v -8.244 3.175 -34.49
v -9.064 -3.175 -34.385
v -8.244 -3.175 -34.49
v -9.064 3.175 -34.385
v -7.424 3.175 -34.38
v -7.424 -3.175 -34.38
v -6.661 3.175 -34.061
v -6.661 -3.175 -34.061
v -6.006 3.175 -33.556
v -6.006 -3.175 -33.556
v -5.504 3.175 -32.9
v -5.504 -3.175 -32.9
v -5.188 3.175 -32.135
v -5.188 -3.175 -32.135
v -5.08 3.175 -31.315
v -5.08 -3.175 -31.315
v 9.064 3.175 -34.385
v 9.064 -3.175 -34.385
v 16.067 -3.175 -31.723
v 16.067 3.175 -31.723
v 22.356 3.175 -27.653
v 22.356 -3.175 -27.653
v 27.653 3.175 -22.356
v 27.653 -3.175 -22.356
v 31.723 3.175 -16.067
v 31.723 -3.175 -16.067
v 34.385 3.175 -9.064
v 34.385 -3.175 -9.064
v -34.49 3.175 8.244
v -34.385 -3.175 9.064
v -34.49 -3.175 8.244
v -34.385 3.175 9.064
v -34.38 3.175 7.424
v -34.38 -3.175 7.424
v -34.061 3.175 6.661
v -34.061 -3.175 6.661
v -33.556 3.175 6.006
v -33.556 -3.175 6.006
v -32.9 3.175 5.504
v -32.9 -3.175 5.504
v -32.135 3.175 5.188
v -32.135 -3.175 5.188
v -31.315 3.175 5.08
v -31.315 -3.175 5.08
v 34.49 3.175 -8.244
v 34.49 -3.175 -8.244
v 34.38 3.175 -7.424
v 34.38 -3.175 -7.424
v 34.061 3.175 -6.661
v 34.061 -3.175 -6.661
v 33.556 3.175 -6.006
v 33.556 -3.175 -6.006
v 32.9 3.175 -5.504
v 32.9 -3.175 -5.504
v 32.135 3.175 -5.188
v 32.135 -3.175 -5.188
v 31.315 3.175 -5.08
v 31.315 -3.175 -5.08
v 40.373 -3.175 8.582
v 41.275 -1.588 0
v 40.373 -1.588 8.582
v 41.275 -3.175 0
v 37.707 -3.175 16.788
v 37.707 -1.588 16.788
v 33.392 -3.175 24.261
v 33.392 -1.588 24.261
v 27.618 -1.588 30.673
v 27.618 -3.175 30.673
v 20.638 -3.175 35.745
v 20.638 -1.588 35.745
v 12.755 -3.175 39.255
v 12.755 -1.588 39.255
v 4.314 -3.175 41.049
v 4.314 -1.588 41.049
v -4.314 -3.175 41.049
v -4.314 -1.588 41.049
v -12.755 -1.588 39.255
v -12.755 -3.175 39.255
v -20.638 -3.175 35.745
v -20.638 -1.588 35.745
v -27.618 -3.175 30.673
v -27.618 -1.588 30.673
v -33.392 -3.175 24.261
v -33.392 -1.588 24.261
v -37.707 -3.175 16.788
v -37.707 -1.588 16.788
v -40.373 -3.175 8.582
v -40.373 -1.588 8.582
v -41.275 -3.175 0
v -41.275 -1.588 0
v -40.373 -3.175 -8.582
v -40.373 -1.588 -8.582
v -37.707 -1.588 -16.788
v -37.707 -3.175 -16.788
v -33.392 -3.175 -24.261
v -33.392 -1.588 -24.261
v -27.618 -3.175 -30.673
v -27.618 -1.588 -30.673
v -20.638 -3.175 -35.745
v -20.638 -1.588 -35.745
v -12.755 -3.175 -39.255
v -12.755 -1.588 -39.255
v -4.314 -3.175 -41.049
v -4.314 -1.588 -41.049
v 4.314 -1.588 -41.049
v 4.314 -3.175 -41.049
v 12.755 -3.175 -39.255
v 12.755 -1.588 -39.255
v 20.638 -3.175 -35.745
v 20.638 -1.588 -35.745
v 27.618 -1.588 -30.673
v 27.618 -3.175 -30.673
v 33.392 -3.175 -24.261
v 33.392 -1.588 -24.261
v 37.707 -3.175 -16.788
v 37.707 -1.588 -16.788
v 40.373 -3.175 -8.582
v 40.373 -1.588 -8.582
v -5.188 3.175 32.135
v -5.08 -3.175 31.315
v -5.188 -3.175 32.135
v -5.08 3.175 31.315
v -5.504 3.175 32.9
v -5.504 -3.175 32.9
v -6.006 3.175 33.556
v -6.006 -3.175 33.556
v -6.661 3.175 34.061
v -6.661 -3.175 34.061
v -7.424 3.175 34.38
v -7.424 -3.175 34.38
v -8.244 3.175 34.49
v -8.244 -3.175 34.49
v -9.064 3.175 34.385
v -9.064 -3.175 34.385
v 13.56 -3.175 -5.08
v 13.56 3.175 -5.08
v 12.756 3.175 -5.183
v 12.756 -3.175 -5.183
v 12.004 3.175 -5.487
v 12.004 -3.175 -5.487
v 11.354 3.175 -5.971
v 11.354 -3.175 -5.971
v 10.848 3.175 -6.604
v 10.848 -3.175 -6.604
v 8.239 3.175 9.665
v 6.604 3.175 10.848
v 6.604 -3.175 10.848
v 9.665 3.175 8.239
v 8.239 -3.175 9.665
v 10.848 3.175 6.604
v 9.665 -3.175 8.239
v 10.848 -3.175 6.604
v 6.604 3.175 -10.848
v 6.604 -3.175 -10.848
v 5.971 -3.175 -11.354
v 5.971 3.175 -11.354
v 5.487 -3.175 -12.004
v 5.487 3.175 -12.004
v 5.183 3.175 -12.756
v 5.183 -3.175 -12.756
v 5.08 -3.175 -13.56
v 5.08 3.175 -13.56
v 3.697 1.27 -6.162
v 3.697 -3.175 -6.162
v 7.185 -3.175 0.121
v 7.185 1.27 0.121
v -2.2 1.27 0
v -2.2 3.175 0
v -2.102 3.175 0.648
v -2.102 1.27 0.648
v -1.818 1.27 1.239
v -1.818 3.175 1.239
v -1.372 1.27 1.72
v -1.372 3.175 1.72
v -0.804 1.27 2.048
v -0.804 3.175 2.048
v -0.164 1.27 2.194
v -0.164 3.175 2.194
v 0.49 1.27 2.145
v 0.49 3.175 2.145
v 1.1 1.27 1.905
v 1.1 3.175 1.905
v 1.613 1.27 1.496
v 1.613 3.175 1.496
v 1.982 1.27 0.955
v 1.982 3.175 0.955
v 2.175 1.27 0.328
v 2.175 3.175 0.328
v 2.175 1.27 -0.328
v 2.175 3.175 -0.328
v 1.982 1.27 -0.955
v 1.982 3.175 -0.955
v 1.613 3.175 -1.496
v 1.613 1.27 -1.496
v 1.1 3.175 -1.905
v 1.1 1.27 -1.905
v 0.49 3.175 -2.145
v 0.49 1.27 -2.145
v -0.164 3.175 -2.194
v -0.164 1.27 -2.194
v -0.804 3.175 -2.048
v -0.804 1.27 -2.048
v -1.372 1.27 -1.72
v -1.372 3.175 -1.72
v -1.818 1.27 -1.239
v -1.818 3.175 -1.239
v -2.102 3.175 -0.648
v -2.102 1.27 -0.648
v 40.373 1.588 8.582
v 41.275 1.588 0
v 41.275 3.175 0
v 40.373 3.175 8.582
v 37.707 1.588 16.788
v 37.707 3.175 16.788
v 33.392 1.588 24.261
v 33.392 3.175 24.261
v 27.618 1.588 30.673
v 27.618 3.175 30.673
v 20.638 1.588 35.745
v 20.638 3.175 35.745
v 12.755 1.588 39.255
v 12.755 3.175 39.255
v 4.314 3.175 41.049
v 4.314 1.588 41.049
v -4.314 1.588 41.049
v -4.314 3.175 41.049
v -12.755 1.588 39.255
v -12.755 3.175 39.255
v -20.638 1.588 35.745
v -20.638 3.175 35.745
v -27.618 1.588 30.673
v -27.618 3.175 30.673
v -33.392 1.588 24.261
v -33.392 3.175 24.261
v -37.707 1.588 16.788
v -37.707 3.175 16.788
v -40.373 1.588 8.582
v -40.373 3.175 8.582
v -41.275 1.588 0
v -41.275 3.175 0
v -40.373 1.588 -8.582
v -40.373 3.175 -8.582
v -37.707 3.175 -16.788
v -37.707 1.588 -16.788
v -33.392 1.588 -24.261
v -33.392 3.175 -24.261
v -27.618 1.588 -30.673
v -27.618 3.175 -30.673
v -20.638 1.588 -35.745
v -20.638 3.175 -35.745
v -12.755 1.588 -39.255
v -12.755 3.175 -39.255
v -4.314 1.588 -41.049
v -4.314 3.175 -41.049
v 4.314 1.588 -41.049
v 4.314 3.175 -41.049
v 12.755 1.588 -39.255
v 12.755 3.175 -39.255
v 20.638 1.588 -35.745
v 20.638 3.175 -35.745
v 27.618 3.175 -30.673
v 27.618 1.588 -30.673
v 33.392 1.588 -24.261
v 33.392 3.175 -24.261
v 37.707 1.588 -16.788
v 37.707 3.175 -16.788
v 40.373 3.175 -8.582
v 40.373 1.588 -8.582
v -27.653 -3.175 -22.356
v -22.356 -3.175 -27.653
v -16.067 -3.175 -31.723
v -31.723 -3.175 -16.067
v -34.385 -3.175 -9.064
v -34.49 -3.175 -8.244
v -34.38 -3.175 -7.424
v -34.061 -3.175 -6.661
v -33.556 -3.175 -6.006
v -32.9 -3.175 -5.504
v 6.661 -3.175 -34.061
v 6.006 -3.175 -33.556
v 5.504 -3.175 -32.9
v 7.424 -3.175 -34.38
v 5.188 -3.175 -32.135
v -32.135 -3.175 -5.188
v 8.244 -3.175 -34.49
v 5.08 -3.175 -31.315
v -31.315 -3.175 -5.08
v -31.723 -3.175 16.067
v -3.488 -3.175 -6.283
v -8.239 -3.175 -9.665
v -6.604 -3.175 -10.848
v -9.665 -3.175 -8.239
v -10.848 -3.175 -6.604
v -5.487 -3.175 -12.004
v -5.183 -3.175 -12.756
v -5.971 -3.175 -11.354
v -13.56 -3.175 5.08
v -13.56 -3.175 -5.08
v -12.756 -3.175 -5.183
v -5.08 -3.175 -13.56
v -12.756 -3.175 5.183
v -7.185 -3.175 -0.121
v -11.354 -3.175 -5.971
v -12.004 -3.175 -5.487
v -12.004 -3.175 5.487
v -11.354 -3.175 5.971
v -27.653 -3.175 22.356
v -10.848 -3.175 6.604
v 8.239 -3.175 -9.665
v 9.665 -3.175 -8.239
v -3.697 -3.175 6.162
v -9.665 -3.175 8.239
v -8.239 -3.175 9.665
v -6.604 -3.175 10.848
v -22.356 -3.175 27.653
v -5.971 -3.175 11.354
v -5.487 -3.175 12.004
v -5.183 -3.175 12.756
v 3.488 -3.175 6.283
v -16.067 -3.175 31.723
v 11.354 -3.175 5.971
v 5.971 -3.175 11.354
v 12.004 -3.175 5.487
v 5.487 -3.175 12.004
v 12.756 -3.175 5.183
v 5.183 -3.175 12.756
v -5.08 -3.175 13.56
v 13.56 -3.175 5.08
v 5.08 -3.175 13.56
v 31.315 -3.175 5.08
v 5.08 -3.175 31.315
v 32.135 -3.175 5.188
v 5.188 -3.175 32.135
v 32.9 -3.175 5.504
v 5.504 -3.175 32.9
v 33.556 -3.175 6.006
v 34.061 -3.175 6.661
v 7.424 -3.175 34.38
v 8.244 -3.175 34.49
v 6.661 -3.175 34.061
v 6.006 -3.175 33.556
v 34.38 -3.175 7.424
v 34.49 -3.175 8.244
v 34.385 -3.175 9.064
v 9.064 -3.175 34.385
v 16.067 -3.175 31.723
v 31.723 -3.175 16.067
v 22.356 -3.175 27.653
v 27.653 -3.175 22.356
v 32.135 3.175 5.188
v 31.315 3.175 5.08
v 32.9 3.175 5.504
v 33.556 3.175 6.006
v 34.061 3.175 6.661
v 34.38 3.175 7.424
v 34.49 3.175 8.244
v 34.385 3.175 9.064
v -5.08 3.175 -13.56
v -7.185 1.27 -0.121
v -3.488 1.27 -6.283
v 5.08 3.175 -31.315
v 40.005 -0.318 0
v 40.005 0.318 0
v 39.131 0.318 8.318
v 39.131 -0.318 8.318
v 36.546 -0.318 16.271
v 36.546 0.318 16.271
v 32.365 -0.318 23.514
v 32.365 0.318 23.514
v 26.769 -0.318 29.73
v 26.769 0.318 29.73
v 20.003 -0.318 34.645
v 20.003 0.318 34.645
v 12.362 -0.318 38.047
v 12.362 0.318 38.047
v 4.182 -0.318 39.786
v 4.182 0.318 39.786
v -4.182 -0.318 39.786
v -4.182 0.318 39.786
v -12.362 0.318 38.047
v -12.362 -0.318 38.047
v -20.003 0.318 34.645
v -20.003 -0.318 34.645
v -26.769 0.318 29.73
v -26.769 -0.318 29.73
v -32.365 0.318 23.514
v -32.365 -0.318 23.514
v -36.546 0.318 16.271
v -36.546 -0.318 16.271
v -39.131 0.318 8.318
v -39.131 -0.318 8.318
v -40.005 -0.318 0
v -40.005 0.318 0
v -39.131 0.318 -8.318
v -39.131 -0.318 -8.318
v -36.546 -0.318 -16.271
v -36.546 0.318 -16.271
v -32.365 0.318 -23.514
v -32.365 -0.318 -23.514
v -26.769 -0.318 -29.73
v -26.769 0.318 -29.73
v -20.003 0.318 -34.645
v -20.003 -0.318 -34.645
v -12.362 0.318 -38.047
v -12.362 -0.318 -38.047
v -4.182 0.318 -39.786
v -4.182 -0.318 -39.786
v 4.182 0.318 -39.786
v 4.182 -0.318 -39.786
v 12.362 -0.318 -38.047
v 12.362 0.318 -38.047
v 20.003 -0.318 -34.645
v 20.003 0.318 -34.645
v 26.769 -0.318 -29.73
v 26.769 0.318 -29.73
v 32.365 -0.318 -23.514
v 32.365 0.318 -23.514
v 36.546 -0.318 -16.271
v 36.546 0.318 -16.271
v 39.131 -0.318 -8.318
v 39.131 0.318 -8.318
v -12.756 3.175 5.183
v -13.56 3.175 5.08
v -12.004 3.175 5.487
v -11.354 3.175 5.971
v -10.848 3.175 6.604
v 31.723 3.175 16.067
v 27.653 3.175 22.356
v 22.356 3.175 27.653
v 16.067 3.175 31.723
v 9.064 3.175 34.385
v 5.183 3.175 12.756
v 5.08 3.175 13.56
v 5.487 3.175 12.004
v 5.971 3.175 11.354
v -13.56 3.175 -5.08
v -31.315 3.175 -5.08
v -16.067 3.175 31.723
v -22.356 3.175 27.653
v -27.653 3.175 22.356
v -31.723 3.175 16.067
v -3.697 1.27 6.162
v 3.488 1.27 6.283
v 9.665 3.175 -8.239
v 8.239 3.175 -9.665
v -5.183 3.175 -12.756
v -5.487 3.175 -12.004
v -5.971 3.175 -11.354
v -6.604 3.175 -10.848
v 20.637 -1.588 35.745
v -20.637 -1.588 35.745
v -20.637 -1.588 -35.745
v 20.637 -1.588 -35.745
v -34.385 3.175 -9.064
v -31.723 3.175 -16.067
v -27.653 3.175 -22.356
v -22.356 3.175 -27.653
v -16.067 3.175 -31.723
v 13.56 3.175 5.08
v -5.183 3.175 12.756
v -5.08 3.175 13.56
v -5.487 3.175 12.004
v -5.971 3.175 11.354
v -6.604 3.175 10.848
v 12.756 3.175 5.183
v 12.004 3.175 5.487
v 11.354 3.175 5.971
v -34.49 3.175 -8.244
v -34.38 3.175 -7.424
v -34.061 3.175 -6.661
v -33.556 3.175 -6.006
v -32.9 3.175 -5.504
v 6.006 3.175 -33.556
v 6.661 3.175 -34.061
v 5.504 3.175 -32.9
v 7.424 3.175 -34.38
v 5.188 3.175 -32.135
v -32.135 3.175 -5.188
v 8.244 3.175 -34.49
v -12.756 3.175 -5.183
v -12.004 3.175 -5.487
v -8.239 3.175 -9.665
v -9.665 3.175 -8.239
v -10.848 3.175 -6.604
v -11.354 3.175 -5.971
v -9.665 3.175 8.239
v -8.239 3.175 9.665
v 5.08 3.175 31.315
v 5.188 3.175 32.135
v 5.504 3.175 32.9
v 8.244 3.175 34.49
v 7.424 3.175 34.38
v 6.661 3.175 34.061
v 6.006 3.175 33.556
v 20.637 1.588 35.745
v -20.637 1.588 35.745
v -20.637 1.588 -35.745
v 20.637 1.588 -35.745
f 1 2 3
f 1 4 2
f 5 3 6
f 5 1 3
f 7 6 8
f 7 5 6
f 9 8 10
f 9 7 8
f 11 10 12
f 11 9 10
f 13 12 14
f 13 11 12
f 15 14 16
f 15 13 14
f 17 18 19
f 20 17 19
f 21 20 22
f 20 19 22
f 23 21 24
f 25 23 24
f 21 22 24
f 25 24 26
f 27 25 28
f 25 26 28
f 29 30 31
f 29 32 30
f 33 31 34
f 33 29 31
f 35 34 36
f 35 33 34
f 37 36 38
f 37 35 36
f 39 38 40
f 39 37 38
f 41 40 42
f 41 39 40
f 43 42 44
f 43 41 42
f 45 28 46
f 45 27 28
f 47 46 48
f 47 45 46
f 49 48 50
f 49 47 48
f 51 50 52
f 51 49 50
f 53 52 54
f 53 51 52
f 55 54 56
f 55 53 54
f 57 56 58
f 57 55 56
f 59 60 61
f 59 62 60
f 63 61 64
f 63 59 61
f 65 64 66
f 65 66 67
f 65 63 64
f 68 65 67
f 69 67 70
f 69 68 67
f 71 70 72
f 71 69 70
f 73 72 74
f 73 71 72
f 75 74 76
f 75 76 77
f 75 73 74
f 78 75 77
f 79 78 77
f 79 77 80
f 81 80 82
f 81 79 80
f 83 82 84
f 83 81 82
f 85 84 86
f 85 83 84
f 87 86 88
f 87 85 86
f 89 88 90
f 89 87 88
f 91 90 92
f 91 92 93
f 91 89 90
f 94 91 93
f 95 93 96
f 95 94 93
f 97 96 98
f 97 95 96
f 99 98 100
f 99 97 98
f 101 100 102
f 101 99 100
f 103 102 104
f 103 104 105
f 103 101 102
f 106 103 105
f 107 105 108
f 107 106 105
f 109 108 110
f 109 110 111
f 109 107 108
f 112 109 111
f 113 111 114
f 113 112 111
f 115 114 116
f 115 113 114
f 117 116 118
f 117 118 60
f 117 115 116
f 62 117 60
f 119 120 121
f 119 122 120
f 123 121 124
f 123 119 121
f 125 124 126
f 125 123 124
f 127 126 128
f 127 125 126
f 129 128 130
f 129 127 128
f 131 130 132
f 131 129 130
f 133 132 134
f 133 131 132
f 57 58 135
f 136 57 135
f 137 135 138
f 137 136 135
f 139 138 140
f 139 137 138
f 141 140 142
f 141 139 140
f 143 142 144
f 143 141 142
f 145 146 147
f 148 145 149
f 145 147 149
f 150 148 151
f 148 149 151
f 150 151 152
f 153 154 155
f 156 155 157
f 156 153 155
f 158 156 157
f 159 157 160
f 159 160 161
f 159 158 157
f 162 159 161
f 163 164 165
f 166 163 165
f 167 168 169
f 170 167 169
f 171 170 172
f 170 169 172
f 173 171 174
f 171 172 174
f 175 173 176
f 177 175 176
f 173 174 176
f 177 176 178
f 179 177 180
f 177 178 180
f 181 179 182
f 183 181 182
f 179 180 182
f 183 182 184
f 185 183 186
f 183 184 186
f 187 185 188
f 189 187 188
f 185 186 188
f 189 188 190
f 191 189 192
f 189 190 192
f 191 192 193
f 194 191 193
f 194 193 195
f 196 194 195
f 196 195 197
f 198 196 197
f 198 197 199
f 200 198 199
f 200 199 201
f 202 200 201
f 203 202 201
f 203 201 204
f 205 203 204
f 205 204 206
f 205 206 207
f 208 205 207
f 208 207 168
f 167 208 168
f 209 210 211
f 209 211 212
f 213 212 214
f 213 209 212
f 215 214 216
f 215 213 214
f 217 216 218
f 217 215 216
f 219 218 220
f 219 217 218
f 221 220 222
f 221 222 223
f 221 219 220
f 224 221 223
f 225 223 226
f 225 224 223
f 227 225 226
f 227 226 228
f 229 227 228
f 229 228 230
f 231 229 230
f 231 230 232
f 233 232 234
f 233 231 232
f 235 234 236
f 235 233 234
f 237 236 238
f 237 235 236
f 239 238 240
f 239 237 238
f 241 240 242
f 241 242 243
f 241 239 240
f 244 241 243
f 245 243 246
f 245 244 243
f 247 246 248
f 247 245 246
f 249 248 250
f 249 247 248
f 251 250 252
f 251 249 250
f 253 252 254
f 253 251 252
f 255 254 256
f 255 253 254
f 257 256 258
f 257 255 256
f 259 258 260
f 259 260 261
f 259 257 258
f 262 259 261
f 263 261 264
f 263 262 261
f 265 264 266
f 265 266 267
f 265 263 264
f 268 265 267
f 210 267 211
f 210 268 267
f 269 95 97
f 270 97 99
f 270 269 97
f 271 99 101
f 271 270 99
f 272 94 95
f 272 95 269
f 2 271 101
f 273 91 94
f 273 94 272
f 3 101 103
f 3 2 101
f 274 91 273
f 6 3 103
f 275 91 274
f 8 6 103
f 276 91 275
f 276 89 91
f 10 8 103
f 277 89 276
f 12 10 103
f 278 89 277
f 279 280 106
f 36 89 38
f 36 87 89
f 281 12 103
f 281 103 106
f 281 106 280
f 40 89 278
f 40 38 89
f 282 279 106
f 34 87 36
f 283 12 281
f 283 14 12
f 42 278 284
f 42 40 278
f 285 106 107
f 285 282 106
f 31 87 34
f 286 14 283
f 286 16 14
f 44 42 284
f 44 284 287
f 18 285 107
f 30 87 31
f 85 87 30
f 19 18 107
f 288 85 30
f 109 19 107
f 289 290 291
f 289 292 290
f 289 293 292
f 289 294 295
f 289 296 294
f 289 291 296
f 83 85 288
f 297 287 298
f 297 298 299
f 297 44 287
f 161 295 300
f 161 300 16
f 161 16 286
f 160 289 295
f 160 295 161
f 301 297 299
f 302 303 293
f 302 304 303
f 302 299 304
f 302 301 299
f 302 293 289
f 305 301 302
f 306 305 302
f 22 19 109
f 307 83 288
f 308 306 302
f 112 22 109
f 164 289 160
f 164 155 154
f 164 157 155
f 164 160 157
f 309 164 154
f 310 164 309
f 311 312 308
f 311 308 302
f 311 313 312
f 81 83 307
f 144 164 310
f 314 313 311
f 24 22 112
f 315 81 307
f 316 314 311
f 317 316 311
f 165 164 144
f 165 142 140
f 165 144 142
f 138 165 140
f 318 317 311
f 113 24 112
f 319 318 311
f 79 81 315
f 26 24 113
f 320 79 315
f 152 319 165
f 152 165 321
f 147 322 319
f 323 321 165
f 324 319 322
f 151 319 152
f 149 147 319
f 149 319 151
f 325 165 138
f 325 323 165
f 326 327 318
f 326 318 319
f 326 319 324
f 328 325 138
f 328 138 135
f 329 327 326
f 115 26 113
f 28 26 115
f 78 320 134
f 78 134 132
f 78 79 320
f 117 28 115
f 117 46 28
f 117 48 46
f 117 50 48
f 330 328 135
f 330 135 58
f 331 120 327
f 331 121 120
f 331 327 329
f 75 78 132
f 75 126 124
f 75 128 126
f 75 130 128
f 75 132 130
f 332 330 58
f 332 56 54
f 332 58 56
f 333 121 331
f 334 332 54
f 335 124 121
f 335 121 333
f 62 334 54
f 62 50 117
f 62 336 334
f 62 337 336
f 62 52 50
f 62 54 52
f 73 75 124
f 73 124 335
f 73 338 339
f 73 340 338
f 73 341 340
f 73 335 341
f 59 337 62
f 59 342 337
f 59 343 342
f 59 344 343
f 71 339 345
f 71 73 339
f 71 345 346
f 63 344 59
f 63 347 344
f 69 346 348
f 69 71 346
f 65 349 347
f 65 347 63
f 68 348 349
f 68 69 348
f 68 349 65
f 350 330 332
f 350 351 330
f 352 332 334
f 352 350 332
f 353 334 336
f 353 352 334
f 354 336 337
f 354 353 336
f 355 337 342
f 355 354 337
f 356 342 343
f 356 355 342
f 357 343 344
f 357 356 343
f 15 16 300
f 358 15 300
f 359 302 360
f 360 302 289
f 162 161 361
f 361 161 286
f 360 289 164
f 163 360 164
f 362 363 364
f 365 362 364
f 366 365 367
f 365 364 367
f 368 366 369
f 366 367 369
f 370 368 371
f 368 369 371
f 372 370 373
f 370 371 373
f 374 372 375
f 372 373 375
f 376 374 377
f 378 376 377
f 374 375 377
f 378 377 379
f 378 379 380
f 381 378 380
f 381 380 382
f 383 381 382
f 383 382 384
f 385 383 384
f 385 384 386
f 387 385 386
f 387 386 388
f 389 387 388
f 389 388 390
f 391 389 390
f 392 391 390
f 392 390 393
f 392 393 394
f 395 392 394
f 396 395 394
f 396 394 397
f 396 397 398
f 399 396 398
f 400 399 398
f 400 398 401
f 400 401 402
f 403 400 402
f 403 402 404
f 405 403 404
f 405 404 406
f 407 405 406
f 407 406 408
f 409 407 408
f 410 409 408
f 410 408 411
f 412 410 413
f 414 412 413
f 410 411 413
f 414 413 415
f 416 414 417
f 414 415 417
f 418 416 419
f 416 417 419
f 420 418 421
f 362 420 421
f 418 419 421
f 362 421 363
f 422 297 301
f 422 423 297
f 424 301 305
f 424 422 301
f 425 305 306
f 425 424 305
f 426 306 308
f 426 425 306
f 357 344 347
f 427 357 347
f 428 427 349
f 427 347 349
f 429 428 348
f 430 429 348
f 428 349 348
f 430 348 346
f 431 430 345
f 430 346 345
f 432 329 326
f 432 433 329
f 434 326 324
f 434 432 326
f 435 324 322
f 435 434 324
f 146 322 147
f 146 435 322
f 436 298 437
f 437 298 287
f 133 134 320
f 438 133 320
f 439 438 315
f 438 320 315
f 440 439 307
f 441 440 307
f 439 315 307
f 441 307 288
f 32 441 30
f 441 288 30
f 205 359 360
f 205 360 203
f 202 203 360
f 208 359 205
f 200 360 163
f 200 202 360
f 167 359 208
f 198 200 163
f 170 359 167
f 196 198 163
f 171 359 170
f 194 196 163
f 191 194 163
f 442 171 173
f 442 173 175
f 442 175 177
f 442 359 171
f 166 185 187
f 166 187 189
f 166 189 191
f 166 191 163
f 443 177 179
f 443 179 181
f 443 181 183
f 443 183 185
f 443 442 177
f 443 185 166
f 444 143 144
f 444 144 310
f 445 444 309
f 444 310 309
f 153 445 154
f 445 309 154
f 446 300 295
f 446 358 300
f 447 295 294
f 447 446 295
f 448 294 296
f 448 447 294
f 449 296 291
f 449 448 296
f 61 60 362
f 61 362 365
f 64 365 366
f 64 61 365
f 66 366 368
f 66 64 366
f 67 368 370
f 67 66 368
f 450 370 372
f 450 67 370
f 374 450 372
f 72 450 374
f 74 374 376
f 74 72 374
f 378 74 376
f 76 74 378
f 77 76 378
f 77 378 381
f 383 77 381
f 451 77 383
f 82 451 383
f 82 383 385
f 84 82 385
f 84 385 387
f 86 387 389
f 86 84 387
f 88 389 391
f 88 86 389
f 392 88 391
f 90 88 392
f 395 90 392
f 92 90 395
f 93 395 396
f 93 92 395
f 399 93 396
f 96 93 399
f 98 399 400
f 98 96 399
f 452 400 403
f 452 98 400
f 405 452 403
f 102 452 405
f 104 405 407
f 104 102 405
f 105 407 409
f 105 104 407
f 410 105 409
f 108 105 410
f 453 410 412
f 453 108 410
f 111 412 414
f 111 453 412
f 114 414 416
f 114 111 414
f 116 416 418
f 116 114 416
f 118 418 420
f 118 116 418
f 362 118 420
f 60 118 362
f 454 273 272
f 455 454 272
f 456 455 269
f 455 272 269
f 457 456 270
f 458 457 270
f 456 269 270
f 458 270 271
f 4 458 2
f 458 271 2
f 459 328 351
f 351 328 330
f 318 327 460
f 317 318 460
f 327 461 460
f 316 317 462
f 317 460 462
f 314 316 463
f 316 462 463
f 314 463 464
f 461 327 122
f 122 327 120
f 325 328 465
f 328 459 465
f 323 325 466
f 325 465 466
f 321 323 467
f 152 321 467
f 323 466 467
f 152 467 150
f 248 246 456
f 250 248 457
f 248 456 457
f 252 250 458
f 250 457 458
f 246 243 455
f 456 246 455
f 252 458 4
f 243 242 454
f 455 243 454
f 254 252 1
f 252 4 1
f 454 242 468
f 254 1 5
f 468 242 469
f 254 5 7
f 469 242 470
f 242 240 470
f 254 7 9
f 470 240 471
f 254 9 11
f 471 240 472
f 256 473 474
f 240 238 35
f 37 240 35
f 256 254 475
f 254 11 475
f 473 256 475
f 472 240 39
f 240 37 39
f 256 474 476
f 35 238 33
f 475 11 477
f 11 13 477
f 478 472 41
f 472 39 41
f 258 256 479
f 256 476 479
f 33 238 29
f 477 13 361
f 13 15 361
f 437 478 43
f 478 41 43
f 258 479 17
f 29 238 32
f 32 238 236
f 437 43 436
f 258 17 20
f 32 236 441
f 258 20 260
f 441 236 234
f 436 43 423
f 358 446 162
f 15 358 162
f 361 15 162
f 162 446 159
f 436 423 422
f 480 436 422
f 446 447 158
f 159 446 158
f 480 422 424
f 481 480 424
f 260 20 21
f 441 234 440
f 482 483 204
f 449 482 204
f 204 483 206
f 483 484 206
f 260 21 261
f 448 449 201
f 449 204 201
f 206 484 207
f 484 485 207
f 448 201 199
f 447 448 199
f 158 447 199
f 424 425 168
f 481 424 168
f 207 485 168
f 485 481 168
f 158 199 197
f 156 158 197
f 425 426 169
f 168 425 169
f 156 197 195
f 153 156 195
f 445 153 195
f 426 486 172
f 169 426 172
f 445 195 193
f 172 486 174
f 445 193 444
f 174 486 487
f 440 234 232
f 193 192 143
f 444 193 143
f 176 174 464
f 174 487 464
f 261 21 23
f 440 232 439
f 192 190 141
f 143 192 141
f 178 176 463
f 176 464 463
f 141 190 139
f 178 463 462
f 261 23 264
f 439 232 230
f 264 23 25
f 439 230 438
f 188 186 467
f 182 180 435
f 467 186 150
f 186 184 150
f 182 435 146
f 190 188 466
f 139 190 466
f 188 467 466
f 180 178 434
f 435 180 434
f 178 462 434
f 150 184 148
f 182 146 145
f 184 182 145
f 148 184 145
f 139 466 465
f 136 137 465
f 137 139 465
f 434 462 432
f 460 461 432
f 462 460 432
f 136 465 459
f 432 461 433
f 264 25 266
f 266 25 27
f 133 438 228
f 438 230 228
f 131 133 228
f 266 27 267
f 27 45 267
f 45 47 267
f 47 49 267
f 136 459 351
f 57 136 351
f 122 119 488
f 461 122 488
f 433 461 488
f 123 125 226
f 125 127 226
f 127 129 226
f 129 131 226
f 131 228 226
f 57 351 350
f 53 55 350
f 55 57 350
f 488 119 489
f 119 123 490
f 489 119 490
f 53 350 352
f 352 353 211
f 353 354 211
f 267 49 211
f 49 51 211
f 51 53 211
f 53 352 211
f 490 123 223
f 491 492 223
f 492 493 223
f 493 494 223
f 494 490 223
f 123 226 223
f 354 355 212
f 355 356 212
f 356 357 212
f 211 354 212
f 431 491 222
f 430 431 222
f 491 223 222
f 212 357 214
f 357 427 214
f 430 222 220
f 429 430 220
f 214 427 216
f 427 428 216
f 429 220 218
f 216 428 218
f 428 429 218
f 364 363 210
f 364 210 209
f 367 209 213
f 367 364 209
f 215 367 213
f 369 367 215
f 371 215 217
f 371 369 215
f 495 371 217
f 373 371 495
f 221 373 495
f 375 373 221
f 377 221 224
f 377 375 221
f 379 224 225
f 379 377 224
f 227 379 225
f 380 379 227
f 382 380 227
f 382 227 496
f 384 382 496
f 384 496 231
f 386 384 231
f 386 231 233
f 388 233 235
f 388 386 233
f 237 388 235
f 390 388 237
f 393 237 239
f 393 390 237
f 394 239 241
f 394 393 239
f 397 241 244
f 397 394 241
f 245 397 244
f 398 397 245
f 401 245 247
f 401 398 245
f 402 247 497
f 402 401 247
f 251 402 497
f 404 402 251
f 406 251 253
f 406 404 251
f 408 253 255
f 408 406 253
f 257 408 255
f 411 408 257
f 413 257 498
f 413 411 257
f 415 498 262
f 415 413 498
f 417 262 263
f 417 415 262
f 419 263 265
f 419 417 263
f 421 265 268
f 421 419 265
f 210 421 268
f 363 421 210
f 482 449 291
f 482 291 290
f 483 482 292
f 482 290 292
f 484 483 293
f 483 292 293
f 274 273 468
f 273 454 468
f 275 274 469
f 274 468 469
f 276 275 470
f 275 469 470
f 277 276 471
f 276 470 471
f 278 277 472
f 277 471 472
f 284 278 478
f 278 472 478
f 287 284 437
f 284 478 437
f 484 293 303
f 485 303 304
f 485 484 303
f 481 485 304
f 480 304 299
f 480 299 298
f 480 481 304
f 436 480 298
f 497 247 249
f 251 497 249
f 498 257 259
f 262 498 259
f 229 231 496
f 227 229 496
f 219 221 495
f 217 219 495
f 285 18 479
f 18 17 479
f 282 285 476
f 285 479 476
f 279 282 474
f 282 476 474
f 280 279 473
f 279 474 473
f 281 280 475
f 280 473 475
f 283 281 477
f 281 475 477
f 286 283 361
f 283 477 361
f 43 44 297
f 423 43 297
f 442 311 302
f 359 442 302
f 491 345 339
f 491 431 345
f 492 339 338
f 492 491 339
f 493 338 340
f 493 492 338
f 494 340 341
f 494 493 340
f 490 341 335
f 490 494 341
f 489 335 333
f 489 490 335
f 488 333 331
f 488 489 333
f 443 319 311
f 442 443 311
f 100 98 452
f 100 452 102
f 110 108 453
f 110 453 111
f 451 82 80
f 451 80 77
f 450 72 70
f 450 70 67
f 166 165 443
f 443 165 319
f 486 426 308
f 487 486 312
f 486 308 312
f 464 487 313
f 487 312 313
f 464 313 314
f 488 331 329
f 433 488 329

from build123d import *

# Parameters (mm, degrees)
F0_R      = 41.275
F0_R_2    = 40.005
F1_DEPTH  = 3.175
F3_DEPTH  = 4.445
F5_DEPTH  = 6.351
F6_R      = 3.175
F8_D      = 4.4
F9_R      = 41.275
F9_R_2    = 40.005
F10_DEPTH = 1.5875
F11_SIZE  = 1.26999


# Not quite as in the source:
# - a fillet or chamfer is up to 0.001 mm smaller than in the source, because OpenCascade refuses the exact size


with BuildPart() as f1:
    # F0 (on Front) → F1 (new body, symmetric)
    with BuildSketch(Plane.XZ):
        Circle(F0_R)
        Circle(F0_R_2, mode=Mode.SUBTRACT)
        Circle(F0_R_2)
        Polygon((-7.3323484187, 0), (-3.6661742094, 6.35), (3.6661742094, 6.35), (7.3323484187, 0), (3.6661742094, -6.35), (-3.6661742094, -6.35), align=None, mode=Mode.SUBTRACT)
        Polygon((3.6661742094, 6.35), (-3.6661742094, 6.35), (-7.3323484187, 0), (-3.6661742094, -6.35), (3.6661742094, -6.35), (7.3323484187, 0), align=None)
    extrude(amount=F1_DEPTH, both=True)

    # F2 (on face) → F3 (cut)
    with BuildSketch(Plane.XZ.offset(3.175)):
        Polygon((7.1846849266, 0.1208628901), (3.4876721301, 6.2825511097), (-3.6970127965, 6.1616882196), (-7.1846849266, -0.1208628901), (-3.4876721301, -6.2825511097), (3.6970127965, -6.1616882196), align=None)
    extrude(amount=-F3_DEPTH, mode=Mode.SUBTRACT)

    # F4 (on face) → F5 (cut, through all)
    with BuildSketch(Plane.XZ.offset(3.175)):
        with BuildLine():
            ThreePointArc((-35.1952724098, -5.08), (-25.144717139, -25.144717139), (-5.08, -35.1952724098))
            Line((-5.08, -35.1952724098), (-5.08, -11.6397422652))
            ThreePointArc((-5.08, -11.6397422652), (-8.9802561211, -8.9802561211), (-11.6397422652, -5.08))
            Line((-11.6397422652, -5.08), (-35.1952724098, -5.08))
        make_face()
        with BuildLine():
            Line((-5.08, 11.6397422652), (-5.08, 35.1952724098))
            ThreePointArc((-5.08, 35.1952724098), (-25.144717139, 25.144717139), (-35.1952724098, 5.08))
            Line((-35.1952724098, 5.08), (-11.6397422652, 5.08))
            ThreePointArc((-11.6397422652, 5.08), (-8.9802561211, 8.9802561211), (-5.08, 11.6397422652))
        make_face()
        with BuildLine():
            Line((11.6397422652, 5.08), (35.1952724098, 5.08))
            ThreePointArc((35.1952724098, 5.08), (25.144717139, 25.144717139), (5.08, 35.1952724098))
            Line((5.08, 35.1952724098), (5.08, 11.6397422652))
            ThreePointArc((5.08, 11.6397422652), (8.9802561211, 8.9802561211), (11.6397422652, 5.08))
        make_face()
        with BuildLine():
            ThreePointArc((5.08, -35.1952724098), (25.144717139, -25.144717139), (35.1952724098, -5.08))
            Line((35.1952724098, -5.08), (11.6397422652, -5.08))
            ThreePointArc((11.6397422652, -5.08), (8.9802561211, -8.9802561211), (5.08, -11.6397422652))
            Line((5.08, -11.6397422652), (5.08, -35.1952724098))
        make_face()
    extrude(amount=-F5_DEPTH, mode=Mode.SUBTRACT)

    # F6
    f6_edges = [f1.edges().sort_by_distance(p)[0] for p in [
        (-35.195272, 0, -5.08),
        (-11.639742, 0, -5.08),
        (-5.08, 0, -35.195272),
        (-5.08, 0, -11.639742),
        (5.08, 0, -35.195272),
        (5.08, 0, -11.639742),
        (35.195272, 0, -5.08),
        (11.639742, 0, -5.08),
        (-5.08, 0, 35.195272),
        (-5.08, 0, 11.639742),
        (-35.195272, 0, 5.08),
        (-11.639742, 0, 5.08),
        (35.195272, 0, 5.08),
        (11.639742, 0, 5.08),
        (5.08, 0, 35.195272),
        (5.08, 0, 11.639742),
    ]]
    fillet(f6_edges, radius=F6_R)

    # F8 (through all)
    with Locations(Plane.XZ.offset(-1.27)):
        with Locations((0, 0)):
            Hole(F8_D / 2)

    # F9 (on Front) → F10 (cut, symmetric)
    with BuildSketch(Plane.XZ):
        Circle(F9_R)
        Circle(F9_R_2, mode=Mode.SUBTRACT)
    extrude(amount=F10_DEPTH, both=True, mode=Mode.SUBTRACT)

    # F11 (size 1.27 in the source; OpenCascade refuses exactly that, so slightly less here)
    f11_edges = [f1.edges().sort_by_distance(p)[0] for p in [
        (-40.005, 1.5875, 0),
        (-40.005, -1.5875, 0),
    ]]
    chamfer(f11_edges, length=F11_SIZE)


solid = f1.part
